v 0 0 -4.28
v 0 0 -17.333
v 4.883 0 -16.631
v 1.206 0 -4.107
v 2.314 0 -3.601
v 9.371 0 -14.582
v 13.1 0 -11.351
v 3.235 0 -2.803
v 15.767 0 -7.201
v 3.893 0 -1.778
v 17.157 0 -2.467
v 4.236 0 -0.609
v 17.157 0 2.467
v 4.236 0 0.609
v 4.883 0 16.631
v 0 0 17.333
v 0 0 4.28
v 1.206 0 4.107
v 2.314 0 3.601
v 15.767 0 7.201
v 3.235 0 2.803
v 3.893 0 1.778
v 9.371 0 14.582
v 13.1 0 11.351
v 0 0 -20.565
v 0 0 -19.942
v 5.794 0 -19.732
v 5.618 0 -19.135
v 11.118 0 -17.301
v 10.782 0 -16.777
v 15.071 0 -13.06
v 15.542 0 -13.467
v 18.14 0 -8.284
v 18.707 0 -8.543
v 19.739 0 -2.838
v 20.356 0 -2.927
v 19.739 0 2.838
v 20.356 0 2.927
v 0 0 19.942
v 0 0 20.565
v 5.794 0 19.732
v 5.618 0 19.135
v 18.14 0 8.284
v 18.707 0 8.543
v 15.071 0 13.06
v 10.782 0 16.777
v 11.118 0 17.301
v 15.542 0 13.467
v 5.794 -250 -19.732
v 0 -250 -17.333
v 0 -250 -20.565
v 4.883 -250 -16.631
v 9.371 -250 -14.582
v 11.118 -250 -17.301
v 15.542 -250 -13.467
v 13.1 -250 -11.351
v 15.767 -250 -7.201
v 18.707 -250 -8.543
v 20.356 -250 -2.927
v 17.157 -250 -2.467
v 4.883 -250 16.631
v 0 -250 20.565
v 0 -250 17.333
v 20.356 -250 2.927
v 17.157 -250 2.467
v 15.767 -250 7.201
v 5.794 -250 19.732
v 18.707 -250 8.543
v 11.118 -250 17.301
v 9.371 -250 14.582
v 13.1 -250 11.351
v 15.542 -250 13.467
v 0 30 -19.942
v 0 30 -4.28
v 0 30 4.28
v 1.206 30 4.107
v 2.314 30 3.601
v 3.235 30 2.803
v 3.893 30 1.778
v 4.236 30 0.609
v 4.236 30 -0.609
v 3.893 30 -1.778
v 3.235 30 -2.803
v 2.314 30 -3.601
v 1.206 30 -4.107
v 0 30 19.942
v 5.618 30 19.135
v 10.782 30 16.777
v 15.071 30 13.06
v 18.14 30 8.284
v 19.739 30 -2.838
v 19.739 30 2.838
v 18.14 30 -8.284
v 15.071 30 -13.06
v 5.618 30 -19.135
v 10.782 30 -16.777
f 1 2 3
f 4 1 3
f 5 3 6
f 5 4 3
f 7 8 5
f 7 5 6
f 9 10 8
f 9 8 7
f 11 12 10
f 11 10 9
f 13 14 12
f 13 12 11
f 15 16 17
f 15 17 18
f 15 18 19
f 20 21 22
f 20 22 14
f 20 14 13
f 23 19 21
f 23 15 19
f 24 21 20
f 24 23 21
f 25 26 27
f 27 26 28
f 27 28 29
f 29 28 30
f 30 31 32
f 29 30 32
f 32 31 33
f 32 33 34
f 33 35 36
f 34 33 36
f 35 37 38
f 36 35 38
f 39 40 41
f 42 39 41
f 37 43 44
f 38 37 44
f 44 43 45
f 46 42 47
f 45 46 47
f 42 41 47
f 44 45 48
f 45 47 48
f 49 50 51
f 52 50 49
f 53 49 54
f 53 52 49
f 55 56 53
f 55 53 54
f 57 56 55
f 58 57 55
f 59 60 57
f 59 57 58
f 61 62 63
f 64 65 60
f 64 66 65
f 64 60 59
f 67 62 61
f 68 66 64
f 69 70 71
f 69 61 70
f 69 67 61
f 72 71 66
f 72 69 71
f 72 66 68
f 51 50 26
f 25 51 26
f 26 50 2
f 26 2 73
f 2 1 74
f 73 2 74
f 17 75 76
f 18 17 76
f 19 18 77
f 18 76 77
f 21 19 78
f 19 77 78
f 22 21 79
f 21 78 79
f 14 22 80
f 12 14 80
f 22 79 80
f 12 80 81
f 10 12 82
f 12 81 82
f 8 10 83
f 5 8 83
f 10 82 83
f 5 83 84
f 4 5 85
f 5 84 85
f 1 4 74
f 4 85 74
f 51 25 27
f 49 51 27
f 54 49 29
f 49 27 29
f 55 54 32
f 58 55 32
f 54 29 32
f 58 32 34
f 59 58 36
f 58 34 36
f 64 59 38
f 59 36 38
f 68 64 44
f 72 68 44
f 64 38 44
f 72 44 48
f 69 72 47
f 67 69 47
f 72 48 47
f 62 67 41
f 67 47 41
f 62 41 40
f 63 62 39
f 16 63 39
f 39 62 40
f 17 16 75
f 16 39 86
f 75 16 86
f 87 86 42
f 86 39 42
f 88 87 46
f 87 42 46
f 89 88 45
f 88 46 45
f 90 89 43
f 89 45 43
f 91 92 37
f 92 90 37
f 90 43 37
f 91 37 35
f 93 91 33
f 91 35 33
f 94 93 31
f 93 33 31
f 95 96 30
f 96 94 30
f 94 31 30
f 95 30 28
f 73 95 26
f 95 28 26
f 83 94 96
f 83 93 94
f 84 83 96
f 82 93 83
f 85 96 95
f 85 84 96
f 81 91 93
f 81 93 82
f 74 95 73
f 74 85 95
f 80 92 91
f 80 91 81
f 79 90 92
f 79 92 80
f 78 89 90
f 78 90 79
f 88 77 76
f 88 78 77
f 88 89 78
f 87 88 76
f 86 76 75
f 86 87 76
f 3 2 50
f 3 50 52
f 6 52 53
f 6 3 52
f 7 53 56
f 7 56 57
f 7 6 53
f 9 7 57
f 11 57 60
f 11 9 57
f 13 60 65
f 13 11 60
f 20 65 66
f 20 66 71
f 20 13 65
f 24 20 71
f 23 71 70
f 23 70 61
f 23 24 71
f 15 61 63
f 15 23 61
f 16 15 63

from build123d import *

# Parameters (mm, degrees)
F0_R        = 20.565163
F0_R_2      = 17.333449
F1_DEPTH    = 250
F2_R        = 19.942448
F3_DEPTH    = 5
F4_R        = 19.942448
F4_R_2      = 3.853128
F3_FACE_R   = 19.942448
F3_FACE_R_2 = 17.333449
F5_DEPTH    = 25
F6_R        = 4.28003
F7_DEPTH    = 153
F8_W        = 454.783313
F8_H        = 260.354363
F9_DEPTH    = 142


with BuildPart() as f1:
    # F0 (on Front) → F1 (new body)
    with BuildSketch(Plane.XZ):
        Circle(F0_R)
        Circle(F0_R_2, mode=Mode.SUBTRACT)
    extrude(amount=F1_DEPTH)

    # F2 (on Front) → F3 (join)
    with BuildSketch(Plane.XZ):
        Circle(F2_R)
    extrude(amount=-F3_DEPTH)

    # F4 (on face) + F3_face (on face) → F5 (join)
    with BuildSketch(Plane(origin=(0, 5, 0), x_dir=(-1, 0, 0), z_dir=(0, 1, 0))):
        Circle(F4_R)
        Circle(F4_R_2, mode=Mode.SUBTRACT)
        Circle(F4_R_2)
    with BuildSketch(Plane(origin=(0, 5, 0), x_dir=(1, 0, 0), z_dir=(0, 1, 0))):
        Circle(F3_FACE_R)
        Circle(F3_FACE_R_2)
    extrude(amount=F5_DEPTH)

    # F6 (on face) → F7 (cut)
    with BuildSketch(Plane(origin=(0, 30, 0), x_dir=(-1, 0, 0), z_dir=(0, 1, 0))):
        Circle(F6_R)
    extrude(amount=-F7_DEPTH, mode=Mode.SUBTRACT)

    # F8 (on Right) → F9 (cut)
    with BuildSketch(Plane.YZ):
        with Locations((-137.636367, 25.624771)):
            Rectangle(F8_W, F8_H)
    extrude(amount=-F9_DEPTH, mode=Mode.SUBTRACT)


solid = f1.part
